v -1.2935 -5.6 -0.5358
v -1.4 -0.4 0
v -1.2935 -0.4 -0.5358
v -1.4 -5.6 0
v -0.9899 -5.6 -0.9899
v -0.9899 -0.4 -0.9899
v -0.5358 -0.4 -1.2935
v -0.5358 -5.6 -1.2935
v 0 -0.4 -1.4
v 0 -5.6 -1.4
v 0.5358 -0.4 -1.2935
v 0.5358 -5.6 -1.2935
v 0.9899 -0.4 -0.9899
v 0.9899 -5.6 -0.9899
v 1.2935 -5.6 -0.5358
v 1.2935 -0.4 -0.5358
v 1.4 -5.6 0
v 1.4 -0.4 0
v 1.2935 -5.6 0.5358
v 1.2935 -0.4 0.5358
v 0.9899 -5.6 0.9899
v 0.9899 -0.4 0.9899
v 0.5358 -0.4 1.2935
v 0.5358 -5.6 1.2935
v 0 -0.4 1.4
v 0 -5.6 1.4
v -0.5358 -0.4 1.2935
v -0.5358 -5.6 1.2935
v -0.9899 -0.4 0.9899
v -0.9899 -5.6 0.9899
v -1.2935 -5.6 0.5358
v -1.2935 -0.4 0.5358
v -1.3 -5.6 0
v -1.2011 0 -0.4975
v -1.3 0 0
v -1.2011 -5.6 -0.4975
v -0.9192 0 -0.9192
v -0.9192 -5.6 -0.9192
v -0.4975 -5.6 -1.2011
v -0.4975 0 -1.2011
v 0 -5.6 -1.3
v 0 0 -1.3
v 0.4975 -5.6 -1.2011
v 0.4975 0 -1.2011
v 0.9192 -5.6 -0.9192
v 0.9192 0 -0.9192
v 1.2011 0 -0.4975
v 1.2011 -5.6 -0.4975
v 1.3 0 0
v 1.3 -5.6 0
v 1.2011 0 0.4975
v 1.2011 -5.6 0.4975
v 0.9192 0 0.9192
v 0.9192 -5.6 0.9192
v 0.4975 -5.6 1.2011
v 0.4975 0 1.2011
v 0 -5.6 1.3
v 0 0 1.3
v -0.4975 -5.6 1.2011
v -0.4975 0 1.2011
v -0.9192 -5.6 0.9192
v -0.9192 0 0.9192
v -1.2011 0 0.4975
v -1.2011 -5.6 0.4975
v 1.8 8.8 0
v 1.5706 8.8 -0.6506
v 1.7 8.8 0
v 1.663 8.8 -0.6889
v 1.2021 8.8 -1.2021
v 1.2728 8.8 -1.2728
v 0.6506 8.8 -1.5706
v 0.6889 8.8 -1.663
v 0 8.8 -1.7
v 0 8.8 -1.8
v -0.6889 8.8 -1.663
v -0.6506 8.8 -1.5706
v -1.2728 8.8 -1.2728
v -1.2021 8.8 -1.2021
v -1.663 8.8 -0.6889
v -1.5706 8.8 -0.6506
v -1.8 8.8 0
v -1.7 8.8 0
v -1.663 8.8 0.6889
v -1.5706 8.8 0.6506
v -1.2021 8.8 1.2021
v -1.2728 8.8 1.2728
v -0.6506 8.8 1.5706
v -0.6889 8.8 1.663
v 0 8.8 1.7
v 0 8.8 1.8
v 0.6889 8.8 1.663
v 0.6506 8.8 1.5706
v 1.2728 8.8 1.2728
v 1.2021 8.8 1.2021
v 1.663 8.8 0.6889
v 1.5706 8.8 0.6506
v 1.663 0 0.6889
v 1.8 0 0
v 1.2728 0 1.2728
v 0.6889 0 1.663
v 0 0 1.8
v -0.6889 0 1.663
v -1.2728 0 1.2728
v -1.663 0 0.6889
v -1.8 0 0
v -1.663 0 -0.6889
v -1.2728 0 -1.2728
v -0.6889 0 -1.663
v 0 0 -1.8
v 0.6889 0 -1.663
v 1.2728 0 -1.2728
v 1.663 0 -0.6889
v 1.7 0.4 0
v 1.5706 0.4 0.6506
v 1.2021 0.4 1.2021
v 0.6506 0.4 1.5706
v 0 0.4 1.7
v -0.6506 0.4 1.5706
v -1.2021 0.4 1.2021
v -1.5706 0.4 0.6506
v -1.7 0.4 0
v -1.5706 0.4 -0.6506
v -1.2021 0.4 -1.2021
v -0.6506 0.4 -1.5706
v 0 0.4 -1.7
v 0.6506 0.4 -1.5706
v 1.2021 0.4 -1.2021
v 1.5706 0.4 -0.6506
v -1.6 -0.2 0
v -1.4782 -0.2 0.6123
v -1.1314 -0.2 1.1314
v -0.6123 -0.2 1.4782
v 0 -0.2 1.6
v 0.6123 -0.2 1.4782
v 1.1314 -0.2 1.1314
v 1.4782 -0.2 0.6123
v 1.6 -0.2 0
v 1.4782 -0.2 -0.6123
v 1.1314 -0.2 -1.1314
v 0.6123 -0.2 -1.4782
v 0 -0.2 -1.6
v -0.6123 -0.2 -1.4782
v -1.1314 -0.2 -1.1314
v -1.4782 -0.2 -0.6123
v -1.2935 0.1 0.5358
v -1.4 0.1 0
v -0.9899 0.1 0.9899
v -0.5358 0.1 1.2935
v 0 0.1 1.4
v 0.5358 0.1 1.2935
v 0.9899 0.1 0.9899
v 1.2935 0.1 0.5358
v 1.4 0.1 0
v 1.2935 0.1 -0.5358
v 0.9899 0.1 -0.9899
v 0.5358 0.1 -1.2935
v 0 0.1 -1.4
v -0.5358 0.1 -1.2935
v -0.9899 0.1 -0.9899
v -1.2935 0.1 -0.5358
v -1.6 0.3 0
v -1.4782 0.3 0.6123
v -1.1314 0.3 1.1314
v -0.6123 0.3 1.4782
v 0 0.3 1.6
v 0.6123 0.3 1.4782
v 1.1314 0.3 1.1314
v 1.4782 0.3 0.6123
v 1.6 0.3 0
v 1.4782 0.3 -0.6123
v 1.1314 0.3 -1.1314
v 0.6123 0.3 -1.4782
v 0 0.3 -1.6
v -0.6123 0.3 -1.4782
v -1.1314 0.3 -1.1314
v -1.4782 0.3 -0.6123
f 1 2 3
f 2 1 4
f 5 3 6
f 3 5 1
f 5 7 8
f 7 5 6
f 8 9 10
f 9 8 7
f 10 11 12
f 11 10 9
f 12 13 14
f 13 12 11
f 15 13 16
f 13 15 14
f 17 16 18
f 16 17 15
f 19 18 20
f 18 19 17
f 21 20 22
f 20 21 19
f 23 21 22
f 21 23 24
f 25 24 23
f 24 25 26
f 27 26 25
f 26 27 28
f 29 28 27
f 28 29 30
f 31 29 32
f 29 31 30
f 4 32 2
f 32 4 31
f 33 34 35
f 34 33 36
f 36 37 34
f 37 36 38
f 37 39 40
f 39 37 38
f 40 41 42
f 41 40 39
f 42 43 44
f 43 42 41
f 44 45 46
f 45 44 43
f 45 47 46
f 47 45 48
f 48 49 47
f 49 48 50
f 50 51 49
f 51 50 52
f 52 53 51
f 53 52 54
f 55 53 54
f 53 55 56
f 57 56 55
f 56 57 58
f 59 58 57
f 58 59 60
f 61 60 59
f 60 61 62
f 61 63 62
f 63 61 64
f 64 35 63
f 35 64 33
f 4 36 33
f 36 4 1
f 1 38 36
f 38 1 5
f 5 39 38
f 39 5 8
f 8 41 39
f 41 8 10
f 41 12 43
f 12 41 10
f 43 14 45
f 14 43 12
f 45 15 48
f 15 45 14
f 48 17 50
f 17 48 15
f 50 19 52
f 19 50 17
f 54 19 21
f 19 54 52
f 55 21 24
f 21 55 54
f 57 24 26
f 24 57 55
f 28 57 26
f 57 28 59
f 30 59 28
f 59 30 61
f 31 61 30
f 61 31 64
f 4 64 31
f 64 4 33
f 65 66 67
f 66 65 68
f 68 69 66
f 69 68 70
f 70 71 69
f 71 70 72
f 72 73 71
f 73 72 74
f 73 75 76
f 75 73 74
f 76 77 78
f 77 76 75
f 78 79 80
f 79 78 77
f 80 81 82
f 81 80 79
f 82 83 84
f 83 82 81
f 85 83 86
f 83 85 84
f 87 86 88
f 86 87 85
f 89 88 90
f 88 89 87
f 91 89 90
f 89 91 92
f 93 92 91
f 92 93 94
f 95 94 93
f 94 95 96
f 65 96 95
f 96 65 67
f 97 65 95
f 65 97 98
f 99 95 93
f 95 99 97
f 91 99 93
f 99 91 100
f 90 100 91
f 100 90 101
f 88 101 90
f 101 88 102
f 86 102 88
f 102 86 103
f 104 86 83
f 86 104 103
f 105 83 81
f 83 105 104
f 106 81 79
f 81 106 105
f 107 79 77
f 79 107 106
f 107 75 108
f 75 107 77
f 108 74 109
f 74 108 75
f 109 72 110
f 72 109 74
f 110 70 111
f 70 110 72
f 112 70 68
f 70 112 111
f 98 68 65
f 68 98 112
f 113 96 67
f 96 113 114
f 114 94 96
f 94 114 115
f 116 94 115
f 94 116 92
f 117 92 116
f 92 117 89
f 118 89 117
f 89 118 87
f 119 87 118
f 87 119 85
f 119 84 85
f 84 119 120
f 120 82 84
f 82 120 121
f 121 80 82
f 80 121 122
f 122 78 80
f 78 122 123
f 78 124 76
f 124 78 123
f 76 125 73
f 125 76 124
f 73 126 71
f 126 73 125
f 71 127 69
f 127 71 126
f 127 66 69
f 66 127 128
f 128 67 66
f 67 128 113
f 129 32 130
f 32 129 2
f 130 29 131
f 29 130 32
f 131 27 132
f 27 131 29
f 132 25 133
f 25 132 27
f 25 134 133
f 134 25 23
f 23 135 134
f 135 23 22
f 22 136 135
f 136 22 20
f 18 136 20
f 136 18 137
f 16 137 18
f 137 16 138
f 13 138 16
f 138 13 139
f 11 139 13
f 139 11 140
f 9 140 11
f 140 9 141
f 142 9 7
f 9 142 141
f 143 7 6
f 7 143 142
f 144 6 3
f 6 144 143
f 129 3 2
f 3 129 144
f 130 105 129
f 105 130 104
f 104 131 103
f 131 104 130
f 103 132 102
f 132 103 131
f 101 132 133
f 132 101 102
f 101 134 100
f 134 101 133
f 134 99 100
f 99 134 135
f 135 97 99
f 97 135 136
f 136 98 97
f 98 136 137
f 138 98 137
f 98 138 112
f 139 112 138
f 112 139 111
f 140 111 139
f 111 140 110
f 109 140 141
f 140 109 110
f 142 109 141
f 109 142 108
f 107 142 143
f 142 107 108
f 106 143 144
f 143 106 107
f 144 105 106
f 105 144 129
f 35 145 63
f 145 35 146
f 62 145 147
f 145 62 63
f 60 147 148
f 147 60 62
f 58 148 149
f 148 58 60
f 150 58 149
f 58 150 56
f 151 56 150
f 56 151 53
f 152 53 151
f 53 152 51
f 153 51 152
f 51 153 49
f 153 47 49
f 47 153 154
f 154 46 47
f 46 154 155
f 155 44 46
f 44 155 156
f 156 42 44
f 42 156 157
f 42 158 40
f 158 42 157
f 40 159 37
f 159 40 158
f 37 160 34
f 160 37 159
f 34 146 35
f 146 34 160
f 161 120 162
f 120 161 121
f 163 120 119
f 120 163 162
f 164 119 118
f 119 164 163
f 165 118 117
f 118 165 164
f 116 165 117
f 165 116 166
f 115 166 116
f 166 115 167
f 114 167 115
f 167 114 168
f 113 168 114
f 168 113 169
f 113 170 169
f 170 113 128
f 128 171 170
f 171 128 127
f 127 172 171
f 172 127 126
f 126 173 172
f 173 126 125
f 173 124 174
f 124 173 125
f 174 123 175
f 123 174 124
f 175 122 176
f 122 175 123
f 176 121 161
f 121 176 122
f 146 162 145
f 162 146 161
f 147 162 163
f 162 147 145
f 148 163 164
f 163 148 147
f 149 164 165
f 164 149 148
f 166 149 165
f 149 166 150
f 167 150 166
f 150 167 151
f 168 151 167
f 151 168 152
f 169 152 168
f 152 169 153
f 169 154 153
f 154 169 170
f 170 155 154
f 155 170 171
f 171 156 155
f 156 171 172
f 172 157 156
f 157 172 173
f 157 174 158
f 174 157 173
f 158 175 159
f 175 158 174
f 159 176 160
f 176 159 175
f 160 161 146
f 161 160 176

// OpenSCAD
// file: ../p/4-4rin17.scad
use <../lib.scad>
function ldraw_lib__4_4rin17() = [
// 0 Ring 17 x 1.0
// 0 Name: 4-4rin17.dat
// 0 Author: Miklos Hosszu [hmick]
// 0 !LDRAW_ORG Primitive UPDATE 2012-01
// 0 !LICENSE Licensed under CC BY 2.0 and CC BY 4.0 : see CAreadme.txt
// 
// 0 BFC CERTIFY CCW
  [0,"BFC","CERTIFY"],
  [0,"BFC","CCW"],
// 
// 0 !HISTORY 2004-11-06 [PTadmin] Official Update 2004-04
// 0 !HISTORY 2007-06-24 [PTadmin] Header formatted for Contributor Agreement
// 0 !HISTORY 2008-07-01 [PTadmin] Official Update 2008-01
// 0 !HISTORY 2012-02-16 [Philo] Changed to CCW
// 0 !HISTORY 2012-03-30 [PTadmin] Official Update 2012-01
// 
// 
// 4 16 18 0 0 16.6302 0 6.8886 15.7063 0 6.5059 17 0 0
  [4,16,18,0,0,16.6302,0,6.8886,15.7063,0,6.5059,17,0,0],
// 4 16 16.6302 0 6.8886 12.7278 0 12.7278 12.0207 0 12.0207 15.7063 0 6.5059
  [4,16,16.6302,0,6.8886,12.7278,0,12.7278,12.0207,0,12.0207,15.7063,0,6.5059],
// 4 16 12.7278 0 12.7278 6.8886 0 16.6302 6.5059 0 15.7063 12.0207 0 12.0207
  [4,16,12.7278,0,12.7278,6.8886,0,16.6302,6.5059,0,15.7063,12.0207,0,12.0207],
// 4 16 6.8886 0 16.6302 0 0 18 0 0 17 6.5059 0 15.7063
  [4,16,6.8886,0,16.6302,0,0,18,0,0,17,6.5059,0,15.7063],
// 4 16 0 0 18 -6.8886 0 16.6302 -6.5059 0 15.7063 0 0 17
  [4,16,0,0,18,-6.8886,0,16.6302,-6.5059,0,15.7063,0,0,17],
// 4 16 -6.8886 0 16.6302 -12.7278 0 12.7278 -12.0207 0 12.0207 -6.5059 0 15.7063
  [4,16,-6.8886,0,16.6302,-12.7278,0,12.7278,-12.0207,0,12.0207,-6.5059,0,15.7063],
// 4 16 -12.7278 0 12.7278 -16.6302 0 6.8886 -15.7063 0 6.5059 -12.0207 0 12.0207
  [4,16,-12.7278,0,12.7278,-16.6302,0,6.8886,-15.7063,0,6.5059,-12.0207,0,12.0207],
// 4 16 -16.6302 0 6.8886 -18 0 0 -17 0 0 -15.7063 0 6.5059
  [4,16,-16.6302,0,6.8886,-18,0,0,-17,0,0,-15.7063,0,6.5059],
// 4 16 -18 0 0 -16.6302 0 -6.8886 -15.7063 0 -6.5059 -17 0 0
  [4,16,-18,0,0,-16.6302,0,-6.8886,-15.7063,0,-6.5059,-17,0,0],
// 4 16 -16.6302 0 -6.8886 -12.7278 0 -12.7278 -12.0207 0 -12.0207 -15.7063 0 -6.5059
  [4,16,-16.6302,0,-6.8886,-12.7278,0,-12.7278,-12.0207,0,-12.0207,-15.7063,0,-6.5059],
// 4 16 -12.7278 0 -12.7278 -6.8886 0 -16.6302 -6.5059 0 -15.7063 -12.0207 0 -12.0207
  [4,16,-12.7278,0,-12.7278,-6.8886,0,-16.6302,-6.5059,0,-15.7063,-12.0207,0,-12.0207],
// 4 16 -6.8886 0 -16.6302 0 0 -18 0 0 -17 -6.5059 0 -15.7063
  [4,16,-6.8886,0,-16.6302,0,0,-18,0,0,-17,-6.5059,0,-15.7063],
// 4 16 0 0 -18 6.8886 0 -16.6302 6.5059 0 -15.7063 0 0 -17
  [4,16,0,0,-18,6.8886,0,-16.6302,6.5059,0,-15.7063,0,0,-17],
// 4 16 6.8886 0 -16.6302 12.7278 0 -12.7278 12.0207 0 -12.0207 6.5059 0 -15.7063
  [4,16,6.8886,0,-16.6302,12.7278,0,-12.7278,12.0207,0,-12.0207,6.5059,0,-15.7063],
// 4 16 12.7278 0 -12.7278 16.6302 0 -6.8886 15.7063 0 -6.5059 12.0207 0 -12.0207
  [4,16,12.7278,0,-12.7278,16.6302,0,-6.8886,15.7063,0,-6.5059,12.0207,0,-12.0207],
// 4 16 16.6302 0 -6.8886 18 0 0 17 0 0 15.7063 0 -6.5059
  [4,16,16.6302,0,-6.8886,18,0,0,17,0,0,15.7063,0,-6.5059],
];
makepoly(ldraw_lib__4_4rin17(), line=0.2);
// file: ../p/4-4rin13.scad
use <../lib.scad>
function ldraw_lib__4_4rin13() = [
// 0 Ring 13 x 1.0
// 0 Name: 4-4rin13.dat
// 0 Author: John Riley [jriley]
// 0 !LDRAW_ORG Primitive UPDATE 2003-03
// 0 !LICENSE Licensed under CC BY 2.0 and CC BY 4.0 : see CAreadme.txt
// 
// 0 BFC CERTIFY CCW
  [0,"BFC","CERTIFY"],
  [0,"BFC","CCW"],
// 
// 0 !HISTORY 2003-12-19 [PTadmin] Official Update 2003-03
// 0 !HISTORY 2007-06-24 [PTadmin] Header formatted for Contributor Agreement
// 0 !HISTORY 2008-07-01 [PTadmin] Official Update 2008-01
// 
// 
// 4 16 13 0 0 14 0 0 12.9346 0 5.3578 12.0107 0 4.9751
  [4,16,13,0,0,14,0,0,12.9346,0,5.3578,12.0107,0,4.9751],
// 4 16 12.0107 0 4.9751 12.9346 0 5.3578 9.8994 0 9.8994 9.1923 0 9.1923
  [4,16,12.0107,0,4.9751,12.9346,0,5.3578,9.8994,0,9.8994,9.1923,0,9.1923],
// 4 16 9.1923 0 9.1923 9.8994 0 9.8994 5.3578 0 12.9346 4.9751 0 12.0107
  [4,16,9.1923,0,9.1923,9.8994,0,9.8994,5.3578,0,12.9346,4.9751,0,12.0107],
// 4 16 4.9751 0 12.0107 5.3578 0 12.9346 0 0 14 0 0 13
  [4,16,4.9751,0,12.0107,5.3578,0,12.9346,0,0,14,0,0,13],
// 4 16 0 0 13 0 0 14 -5.3578 0 12.9346 -4.9751 0 12.0107
  [4,16,0,0,13,0,0,14,-5.3578,0,12.9346,-4.9751,0,12.0107],
// 4 16 -4.9751 0 12.0107 -5.3578 0 12.9346 -9.8994 0 9.8994 -9.1923 0 9.1923
  [4,16,-4.9751,0,12.0107,-5.3578,0,12.9346,-9.8994,0,9.8994,-9.1923,0,9.1923],
// 4 16 -9.1923 0 9.1923 -9.8994 0 9.8994 -12.9346 0 5.3578 -12.0107 0 4.9751
  [4,16,-9.1923,0,9.1923,-9.8994,0,9.8994,-12.9346,0,5.3578,-12.0107,0,4.9751],
// 4 16 -12.0107 0 4.9751 -12.9346 0 5.3578 -14 0 0 -13 0 0
  [4,16,-12.0107,0,4.9751,-12.9346,0,5.3578,-14,0,0,-13,0,0],
// 4 16 -13 0 0 -14 0 0 -12.9346 0 -5.3578 -12.0107 0 -4.9751
  [4,16,-13,0,0,-14,0,0,-12.9346,0,-5.3578,-12.0107,0,-4.9751],
// 4 16 -12.0107 0 -4.9751 -12.9346 0 -5.3578 -9.8994 0 -9.8994 -9.1923 0 -9.1923
  [4,16,-12.0107,0,-4.9751,-12.9346,0,-5.3578,-9.8994,0,-9.8994,-9.1923,0,-9.1923],
// 4 16 -9.1923 0 -9.1923 -9.8994 0 -9.8994 -5.3578 0 -12.9346 -4.9751 0 -12.0107
  [4,16,-9.1923,0,-9.1923,-9.8994,0,-9.8994,-5.3578,0,-12.9346,-4.9751,0,-12.0107],
// 4 16 -4.9751 0 -12.0107 -5.3578 0 -12.9346 0 0 -14 0 0 -13
  [4,16,-4.9751,0,-12.0107,-5.3578,0,-12.9346,0,0,-14,0,0,-13],
// 4 16 0 0 -13 0 0 -14 5.3578 0 -12.9346 4.9751 0 -12.0107
  [4,16,0,0,-13,0,0,-14,5.3578,0,-12.9346,4.9751,0,-12.0107],
// 4 16 4.9751 0 -12.0107 5.3578 0 -12.9346 9.8994 0 -9.8994 9.1923 0 -9.1923
  [4,16,4.9751,0,-12.0107,5.3578,0,-12.9346,9.8994,0,-9.8994,9.1923,0,-9.1923],
// 4 16 9.1923 0 -9.1923 9.8994 0 -9.8994 12.9346 0 -5.3578 12.0107 0 -4.9751
  [4,16,9.1923,0,-9.1923,9.8994,0,-9.8994,12.9346,0,-5.3578,12.0107,0,-4.9751],
// 4 16 12.0107 0 -4.9751 12.9346 0 -5.3578 14 0 0 13 0 0
  [4,16,12.0107,0,-4.9751,12.9346,0,-5.3578,14,0,0,13,0,0],
// 0
// 
];
makepoly(ldraw_lib__4_4rin13(), line=0.2);
// file: ../p/4-4edge.scad
use <../lib.scad>
function ldraw_lib__4_4edge() = [
// 0 Circle 1.0
// 0 Name: 4-4edge.dat
// 0 Author: James Jessiman
// 0 !LDRAW_ORG Primitive UPDATE 2017-01
// 0 !LICENSE Licensed under CC BY 2.0 and CC BY 4.0 : see CAreadme.txt
// 
// 0 BFC CERTIFY CCW
  [0,"BFC","CERTIFY"],
  [0,"BFC","CCW"],
// 
// 0 !HISTORY 1998-12-15 [PTadmin] Official Update 1998-10
// 0 !HISTORY 2005-12-28 [PTadmin] Official Update 2005-01
// 0 !HISTORY 2007-06-24 [PTadmin] Header formatted for Contributor Agreement
// 0 !HISTORY 2008-07-01 [PTadmin] Official Update 2008-01
// 0 !HISTORY 2017-01-15 [Steffen] BFCed
// 0 !HISTORY 2017-12-30 [PTadmin] Official Update 2017-01
// 
// 
// 2 24 1 0 0 0.9239 0 0.3827
  [2,24,1,0,0,0.9239,0,0.3827],
// 2 24 0.9239 0 0.3827 0.7071 0 0.7071
  [2,24,0.9239,0,0.3827,0.7071,0,0.7071],
// 2 24 0.7071 0 0.7071 0.3827 0 0.9239
  [2,24,0.7071,0,0.7071,0.3827,0,0.9239],
// 2 24 0.3827 0 0.9239 0 0 1
  [2,24,0.3827,0,0.9239,0,0,1],
// 2 24 0 0 1 -0.3827 0 0.9239
  [2,24,0,0,1,-0.3827,0,0.9239],
// 2 24 -0.3827 0 0.9239 -0.7071 0 0.7071
  [2,24,-0.3827,0,0.9239,-0.7071,0,0.7071],
// 2 24 -0.7071 0 0.7071 -0.9239 0 0.3827
  [2,24,-0.7071,0,0.7071,-0.9239,0,0.3827],
// 2 24 -0.9239 0 0.3827 -1 0 -0
  [2,24,-0.9239,0,0.3827,-1,0,-0],
// 2 24 -1 0 -0 -0.9239 0 -0.3827
  [2,24,-1,0,-0,-0.9239,0,-0.3827],
// 2 24 -0.9239 0 -0.3827 -0.7071 0 -0.7071
  [2,24,-0.9239,0,-0.3827,-0.7071,0,-0.7071],
// 2 24 -0.7071 0 -0.7071 -0.3827 0 -0.9239
  [2,24,-0.7071,0,-0.7071,-0.3827,0,-0.9239],
// 2 24 -0.3827 0 -0.9239 0 0 -1
  [2,24,-0.3827,0,-0.9239,0,0,-1],
// 2 24 0 0 -1 0.3827 0 -0.9239
  [2,24,0,0,-1,0.3827,0,-0.9239],
// 2 24 0.3827 0 -0.9239 0.7071 0 -0.7071
  [2,24,0.3827,0,-0.9239,0.7071,0,-0.7071],
// 2 24 0.7071 0 -0.7071 0.9239 0 -0.3827
  [2,24,0.7071,0,-0.7071,0.9239,0,-0.3827],
// 2 24 0.9239 0 -0.3827 1 0 0
  [2,24,0.9239,0,-0.3827,1,0,0],
];
makepoly(ldraw_lib__4_4edge(), line=0.2);
// file: ../p/4-4cyli.scad
use <../lib.scad>
function ldraw_lib__4_4cyli() = [
// 0 Cylinder 1.0
// 0 Name: 4-4cyli.dat
// 0 Author: James Jessiman
// 0 !LDRAW_ORG Primitive UPDATE 2005-01
// 0 !LICENSE Licensed under CC BY 2.0 and CC BY 4.0 : see CAreadme.txt
// 
// 0 BFC CERTIFY CCW
  [0,"BFC","CERTIFY"],
  [0,"BFC","CCW"],
// 
// 0 !HISTORY 1998-12-15 [PTadmin] Official Update 1998-10
// 0 !HISTORY 2002-03-23 [sbliss] Added BFC statement; merged headers from files in distributions LDraw 0.27 and Complete.
// 0 !HISTORY 2002-04-25 [PTadmin] Official Update 2002-02
// 0 !HISTORY 2004-12-14 [guyvivan] BFC CCW
// 0 !HISTORY 2005-12-28 [PTadmin] Official Update 2005-01
// 0 !HISTORY 2007-06-24 [PTadmin] Header formatted for Contributor Agreement
// 0 !HISTORY 2008-07-01 [PTadmin] Official Update 2008-01
// 
// 
// 4 16 1 1 0 0.9239 1 0.3827 0.9239 0 0.3827 1 0 0
  [4,16,1,1,0,0.9239,1,0.3827,0.9239,0,0.3827,1,0,0],
// 5 24 1 0 0 1 1 0 0.9239 0 0.3827 0.9239 0 -0.3827
  [5,24,1,0,0,1,1,0,0.9239,0,0.3827,0.9239,0,-0.3827],
// 4 16 0.9239 1 0.3827 0.7071 1 0.7071 0.7071 0 0.7071 0.9239 0 0.3827
  [4,16,0.9239,1,0.3827,0.7071,1,0.7071,0.7071,0,0.7071,0.9239,0,0.3827],
// 5 24 0.9239 0 0.3827 0.9239 1 0.3827 0.7071 0 0.7071 1 0 0
  [5,24,0.9239,0,0.3827,0.9239,1,0.3827,0.7071,0,0.7071,1,0,0],
// 4 16 0.7071 1 0.7071 0.3827 1 0.9239 0.3827 0 0.9239 0.7071 0 0.7071
  [4,16,0.7071,1,0.7071,0.3827,1,0.9239,0.3827,0,0.9239,0.7071,0,0.7071],
// 5 24 0.7071 0 0.7071 0.7071 1 0.7071 0.3827 0 0.9239 0.9239 0 0.3827
  [5,24,0.7071,0,0.7071,0.7071,1,0.7071,0.3827,0,0.9239,0.9239,0,0.3827],
// 4 16 0.3827 1 0.9239 0 1 1 0 0 1 0.3827 0 0.9239
  [4,16,0.3827,1,0.9239,0,1,1,0,0,1,0.3827,0,0.9239],
// 5 24 0.3827 0 0.9239 0.3827 1 0.9239 0 0 1 0.7071 0 0.7071
  [5,24,0.3827,0,0.9239,0.3827,1,0.9239,0,0,1,0.7071,0,0.7071],
// 4 16 0 1 1 -0.3827 1 0.9239 -0.3827 0 0.9239 0 0 1
  [4,16,0,1,1,-0.3827,1,0.9239,-0.3827,0,0.9239,0,0,1],
// 5 24 0 0 1 0 1 1 -0.3827 0 0.9239 0.3827 0 0.9239
  [5,24,0,0,1,0,1,1,-0.3827,0,0.9239,0.3827,0,0.9239],
// 4 16 -0.3827 1 0.9239 -0.7071 1 0.7071 -0.7071 0 0.7071 -0.3827 0 0.9239
  [4,16,-0.3827,1,0.9239,-0.7071,1,0.7071,-0.7071,0,0.7071,-0.3827,0,0.9239],
// 5 24 -0.3827 0 0.9239 -0.3827 1 0.9239 -0.7071 0 0.7071 0 0 1
  [5,24,-0.3827,0,0.9239,-0.3827,1,0.9239,-0.7071,0,0.7071,0,0,1],
// 4 16 -0.7071 1 0.7071 -0.9239 1 0.3827 -0.9239 0 0.3827 -0.7071 0 0.7071
  [4,16,-0.7071,1,0.7071,-0.9239,1,0.3827,-0.9239,0,0.3827,-0.7071,0,0.7071],
// 5 24 -0.7071 0 0.7071 -0.7071 1 0.7071 -0.9239 0 0.3827 -0.3827 0 0.9239
  [5,24,-0.7071,0,0.7071,-0.7071,1,0.7071,-0.9239,0,0.3827,-0.3827,0,0.9239],
// 4 16 -0.9239 1 0.3827 -1 1 0 -1 0 0 -0.9239 0 0.3827
  [4,16,-0.9239,1,0.3827,-1,1,0,-1,0,0,-0.9239,0,0.3827],
// 5 24 -0.9239 0 0.3827 -0.9239 1 0.3827 -1 0 0 -0.7071 0 0.7071
  [5,24,-0.9239,0,0.3827,-0.9239,1,0.3827,-1,0,0,-0.7071,0,0.7071],
// 4 16 -1 1 0 -0.9239 1 -0.3827 -0.9239 0 -0.3827 -1 0 0
  [4,16,-1,1,0,-0.9239,1,-0.3827,-0.9239,0,-0.3827,-1,0,0],
// 5 24 -1 0 0 -1 1 0 -0.9239 0 -0.3827 -0.9239 0 0.3827
  [5,24,-1,0,0,-1,1,0,-0.9239,0,-0.3827,-0.9239,0,0.3827],
// 4 16 -0.9239 1 -0.3827 -0.7071 1 -0.7071 -0.7071 0 -0.7071 -0.9239 0 -0.3827
  [4,16,-0.9239,1,-0.3827,-0.7071,1,-0.7071,-0.7071,0,-0.7071,-0.9239,0,-0.3827],
// 5 24 -0.9239 0 -0.3827 -0.9239 1 -0.3827 -0.7071 0 -0.7071 -1 0 0
  [5,24,-0.9239,0,-0.3827,-0.9239,1,-0.3827,-0.7071,0,-0.7071,-1,0,0],
// 4 16 -0.7071 1 -0.7071 -0.3827 1 -0.9239 -0.3827 0 -0.9239 -0.7071 0 -0.7071
  [4,16,-0.7071,1,-0.7071,-0.3827,1,-0.9239,-0.3827,0,-0.9239,-0.7071,0,-0.7071],
// 5 24 -0.7071 0 -0.7071 -0.7071 1 -0.7071 -0.3827 0 -0.9239 -0.9239 0 -0.3827
  [5,24,-0.7071,0,-0.7071,-0.7071,1,-0.7071,-0.3827,0,-0.9239,-0.9239,0,-0.3827],
// 4 16 -0.3827 1 -0.9239 0 1 -1 0 0 -1 -0.3827 0 -0.9239
  [4,16,-0.3827,1,-0.9239,0,1,-1,0,0,-1,-0.3827,0,-0.9239],
// 5 24 -0.3827 0 -0.9239 -0.3827 1 -0.9239 0 0 -1 -0.7071 0 -0.7071
  [5,24,-0.3827,0,-0.9239,-0.3827,1,-0.9239,0,0,-1,-0.7071,0,-0.7071],
// 4 16 0 1 -1 0.3827 1 -0.9239 0.3827 0 -0.9239 0 0 -1
  [4,16,0,1,-1,0.3827,1,-0.9239,0.3827,0,-0.9239,0,0,-1],
// 5 24 0 0 -1 0 1 -1 0.3827 0 -0.9239 -0.3827 0 -0.9239
  [5,24,0,0,-1,0,1,-1,0.3827,0,-0.9239,-0.3827,0,-0.9239],
// 4 16 0.3827 1 -0.9239 0.7071 1 -0.7071 0.7071 0 -0.7071 0.3827 0 -0.9239
  [4,16,0.3827,1,-0.9239,0.7071,1,-0.7071,0.7071,0,-0.7071,0.3827,0,-0.9239],
// 5 24 0.3827 0 -0.9239 0.3827 1 -0.9239 0.7071 0 -0.7071 0 0 -1
  [5,24,0.3827,0,-0.9239,0.3827,1,-0.9239,0.7071,0,-0.7071,0,0,-1],
// 4 16 0.7071 1 -0.7071 0.9239 1 -0.3827 0.9239 0 -0.3827 0.7071 0 -0.7071
  [4,16,0.7071,1,-0.7071,0.9239,1,-0.3827,0.9239,0,-0.3827,0.7071,0,-0.7071],
// 5 24 0.7071 0 -0.7071 0.7071 1 -0.7071 0.9239 0 -0.3827 0.3827 0 -0.9239
  [5,24,0.7071,0,-0.7071,0.7071,1,-0.7071,0.9239,0,-0.3827,0.3827,0,-0.9239],
// 4 16 0.9239 1 -0.3827 1 1 0 1 0 0 0.9239 0 -0.3827
  [4,16,0.9239,1,-0.3827,1,1,0,1,0,0,0.9239,0,-0.3827],
// 5 24 0.9239 0 -0.3827 0.9239 1 -0.3827 1 0 0 0.7071 0 -0.7071
  [5,24,0.9239,0,-0.3827,0.9239,1,-0.3827,1,0,0,0.7071,0,-0.7071],
// 0
];
makepoly(ldraw_lib__4_4cyli(), line=0.2);
// file: ../p/4-4con8.scad
use <../lib.scad>
function ldraw_lib__4_4con8() = [
// 0 Cone  8 x 1.0
// 0 Name: 4-4con8.dat
// 0 Author: Steve Bliss [sbliss]
// 0 !LDRAW_ORG Primitive UPDATE 2012-01
// 0 !LICENSE Licensed under CC BY 2.0 and CC BY 4.0 : see CAreadme.txt
// 
// 0 BFC CERTIFY CCW
  [0,"BFC","CERTIFY"],
  [0,"BFC","CCW"],
// 
// 0 !HISTORY 2000-09-30 [PTadmin] Official Update 2000-02
// 0 !HISTORY 2002-12-11 [cwdee] Standardised title
// 0 !HISTORY 2003-03-12 [PTadmin] Official Update 2003-01
// 0 !HISTORY 2007-06-24 [PTadmin] Header formatted for Contributor Agreement
// 0 !HISTORY 2008-07-01 [PTadmin] Official Update 2008-01
// 0 !HISTORY 2012-02-16 [Philo] Changed to CCW
// 0 !HISTORY 2012-03-30 [PTadmin] Official Update 2012-01
// 
// 
// 5 24 8 1 0 9 0 0 7.3912 1 -3.0616 7.3912 1 3.0616
  [5,24,8,1,0,9,0,0,7.3912,1,-3.0616,7.3912,1,3.0616],
// 5 24 7.3912 1 3.0616 8.3151 0 3.4443 8 1 0 5.6568 1 5.6568
  [5,24,7.3912,1,3.0616,8.3151,0,3.4443,8,1,0,5.6568,1,5.6568],
// 5 24 5.6568 1 5.6568 6.3639 0 6.3639 7.3912 1 3.0616 3.0616 1 7.3912
  [5,24,5.6568,1,5.6568,6.3639,0,6.3639,7.3912,1,3.0616,3.0616,1,7.3912],
// 5 24 3.0616 1 7.3912 3.4443 0 8.3151 5.6568 1 5.6568 0 1 8
  [5,24,3.0616,1,7.3912,3.4443,0,8.3151,5.6568,1,5.6568,0,1,8],
// 5 24 0 1 8 0 0 9 3.0616 1 7.3912 -3.0616 1 7.3912
  [5,24,0,1,8,0,0,9,3.0616,1,7.3912,-3.0616,1,7.3912],
// 5 24 -3.0616 1 7.3912 -3.4443 0 8.3151 0 1 8 -5.6568 1 5.6568
  [5,24,-3.0616,1,7.3912,-3.4443,0,8.3151,0,1,8,-5.6568,1,5.6568],
// 5 24 -5.6568 1 5.6568 -6.3639 0 6.3639 -3.0616 1 7.3912 -7.3912 1 3.0616
  [5,24,-5.6568,1,5.6568,-6.3639,0,6.3639,-3.0616,1,7.3912,-7.3912,1,3.0616],
// 5 24 -7.3912 1 3.0616 -8.3151 0 3.4443 -5.6568 1 5.6568 -8 1 0
  [5,24,-7.3912,1,3.0616,-8.3151,0,3.4443,-5.6568,1,5.6568,-8,1,0],
// 5 24 -8 1 0 -9 0 0 -7.3912 1 3.0616 -7.3912 1 -3.0616
  [5,24,-8,1,0,-9,0,0,-7.3912,1,3.0616,-7.3912,1,-3.0616],
// 5 24 -7.3912 1 -3.0616 -8.3151 0 -3.4443 -8 1 0 -5.6568 1 -5.6568
  [5,24,-7.3912,1,-3.0616,-8.3151,0,-3.4443,-8,1,0,-5.6568,1,-5.6568],
// 5 24 -5.6568 1 -5.6568 -6.3639 0 -6.3639 -7.3912 1 -3.0616 -3.0616 1 -7.3912
  [5,24,-5.6568,1,-5.6568,-6.3639,0,-6.3639,-7.3912,1,-3.0616,-3.0616,1,-7.3912],
// 5 24 -3.0616 1 -7.3912 -3.4443 0 -8.3151 -5.6568 1 -5.6568 0 1 -8
  [5,24,-3.0616,1,-7.3912,-3.4443,0,-8.3151,-5.6568,1,-5.6568,0,1,-8],
// 5 24 0 1 -8 0 0 -9 -3.0616 1 -7.3912 3.0616 1 -7.3912
  [5,24,0,1,-8,0,0,-9,-3.0616,1,-7.3912,3.0616,1,-7.3912],
// 5 24 3.0616 1 -7.3912 3.4443 0 -8.3151 0 1 -8 5.6568 1 -5.6568
  [5,24,3.0616,1,-7.3912,3.4443,0,-8.3151,0,1,-8,5.6568,1,-5.6568],
// 5 24 5.6568 1 -5.6568 6.3639 0 -6.3639 3.0616 1 -7.3912 7.3912 1 -3.0616
  [5,24,5.6568,1,-5.6568,6.3639,0,-6.3639,3.0616,1,-7.3912,7.3912,1,-3.0616],
// 5 24 7.3912 1 -3.0616 8.3151 0 -3.4443 5.6568 1 -5.6568 8 1 0
  [5,24,7.3912,1,-3.0616,8.3151,0,-3.4443,5.6568,1,-5.6568,8,1,0],
// 
// 4 16 7.3912 1 3.0616 8.3151 0 3.4443 9 0 0 8 1 0
  [4,16,7.3912,1,3.0616,8.3151,0,3.4443,9,0,0,8,1,0],
// 4 16 5.6568 1 5.6568 6.3639 0 6.3639 8.3151 0 3.4443 7.3912 1 3.0616
  [4,16,5.6568,1,5.6568,6.3639,0,6.3639,8.3151,0,3.4443,7.3912,1,3.0616],
// 4 16 3.0616 1 7.3912 3.4443 0 8.3151 6.3639 0 6.3639 5.6568 1 5.6568
  [4,16,3.0616,1,7.3912,3.4443,0,8.3151,6.3639,0,6.3639,5.6568,1,5.6568],
// 4 16 0 1 8 0 0 9 3.4443 0 8.3151 3.0616 1 7.3912
  [4,16,0,1,8,0,0,9,3.4443,0,8.3151,3.0616,1,7.3912],
// 4 16 -3.0616 1 7.3912 -3.4443 0 8.3151 0 0 9 0 1 8
  [4,16,-3.0616,1,7.3912,-3.4443,0,8.3151,0,0,9,0,1,8],
// 4 16 -5.6568 1 5.6568 -6.3639 0 6.3639 -3.4443 0 8.3151 -3.0616 1 7.3912
  [4,16,-5.6568,1,5.6568,-6.3639,0,6.3639,-3.4443,0,8.3151,-3.0616,1,7.3912],
// 4 16 -7.3912 1 3.0616 -8.3151 0 3.4443 -6.3639 0 6.3639 -5.6568 1 5.6568
  [4,16,-7.3912,1,3.0616,-8.3151,0,3.4443,-6.3639,0,6.3639,-5.6568,1,5.6568],
// 4 16 -8 1 0 -9 0 0 -8.3151 0 3.4443 -7.3912 1 3.0616
  [4,16,-8,1,0,-9,0,0,-8.3151,0,3.4443,-7.3912,1,3.0616],
// 4 16 -7.3912 1 -3.0616 -8.3151 0 -3.4443 -9 0 0 -8 1 0
  [4,16,-7.3912,1,-3.0616,-8.3151,0,-3.4443,-9,0,0,-8,1,0],
// 4 16 -5.6568 1 -5.6568 -6.3639 0 -6.3639 -8.3151 0 -3.4443 -7.3912 1 -3.0616
  [4,16,-5.6568,1,-5.6568,-6.3639,0,-6.3639,-8.3151,0,-3.4443,-7.3912,1,-3.0616],
// 4 16 -3.0616 1 -7.3912 -3.4443 0 -8.3151 -6.3639 0 -6.3639 -5.6568 1 -5.6568
  [4,16,-3.0616,1,-7.3912,-3.4443,0,-8.3151,-6.3639,0,-6.3639,-5.6568,1,-5.6568],
// 4 16 0 1 -8 0 0 -9 -3.4443 0 -8.3151 -3.0616 1 -7.3912
  [4,16,0,1,-8,0,0,-9,-3.4443,0,-8.3151,-3.0616,1,-7.3912],
// 4 16 3.0616 1 -7.3912 3.4443 0 -8.3151 0 0 -9 0 1 -8
  [4,16,3.0616,1,-7.3912,3.4443,0,-8.3151,0,0,-9,0,1,-8],
// 4 16 5.6568 1 -5.6568 6.3639 0 -6.3639 3.4443 0 -8.3151 3.0616 1 -7.3912
  [4,16,5.6568,1,-5.6568,6.3639,0,-6.3639,3.4443,0,-8.3151,3.0616,1,-7.3912],
// 4 16 7.3912 1 -3.0616 8.3151 0 -3.4443 6.3639 0 -6.3639 5.6568 1 -5.6568
  [4,16,7.3912,1,-3.0616,8.3151,0,-3.4443,6.3639,0,-6.3639,5.6568,1,-5.6568],
// 4 16 8 1 0 9 0 0 8.3151 0 -3.4443 7.3912 1 -3.0616
  [4,16,8,1,0,9,0,0,8.3151,0,-3.4443,7.3912,1,-3.0616],
];
makepoly(ldraw_lib__4_4con8(), line=0.2);
// file: ../p/4-4con7.scad
use <../lib.scad>
function ldraw_lib__4_4con7() = [
// 0 Cone  7 x 1.0
// 0 Name: 4-4con7.dat
// 0 Author: Niels Karsdorp [nielsk]
// 0 !LDRAW_ORG Primitive UPDATE 2004-04
// 0 !LICENSE Licensed under CC BY 2.0 and CC BY 4.0 : see CAreadme.txt
// 
// 0 BFC CERTIFY CCW
  [0,"BFC","CERTIFY"],
  [0,"BFC","CCW"],
// 
// 0 !HISTORY 2004-11-06 [PTadmin] Official Update 2004-04
// 0 !HISTORY 2007-06-24 [PTadmin] Header formatted for Contributor Agreement
// 0 !HISTORY 2008-07-01 [PTadmin] Official Update 2008-01
// 
// 
// 5 24 7 1 0 8 0 0 6.4673 1 2.6789 6.4673 1 -2.6789
  [5,24,7,1,0,8,0,0,6.4673,1,2.6789,6.4673,1,-2.6789],
// 5 24 6.4673 1 2.6789 7.3912 0 3.0616 4.9497 1 4.9497 7 1 0
  [5,24,6.4673,1,2.6789,7.3912,0,3.0616,4.9497,1,4.9497,7,1,0],
// 5 24 4.9497 1 4.9497 5.6568 0 5.6568 2.6789 1 6.4673 6.4673 1 2.6789
  [5,24,4.9497,1,4.9497,5.6568,0,5.6568,2.6789,1,6.4673,6.4673,1,2.6789],
// 5 24 2.6789 1 6.4673 3.0616 0 7.3912 0 1 7 4.9497 1 4.9497
  [5,24,2.6789,1,6.4673,3.0616,0,7.3912,0,1,7,4.9497,1,4.9497],
// 5 24 0 1 7 0 0 8 -2.6789 1 6.4673 2.6789 1 6.4673
  [5,24,0,1,7,0,0,8,-2.6789,1,6.4673,2.6789,1,6.4673],
// 5 24 -2.6789 1 6.4673 -3.0616 0 7.3912 -4.9497 1 4.9497 0 1 7
  [5,24,-2.6789,1,6.4673,-3.0616,0,7.3912,-4.9497,1,4.9497,0,1,7],
// 5 24 -4.9497 1 4.9497 -5.6568 0 5.6568 -6.4673 1 2.6789 -2.6789 1 6.4673
  [5,24,-4.9497,1,4.9497,-5.6568,0,5.6568,-6.4673,1,2.6789,-2.6789,1,6.4673],
// 5 24 -6.4673 1 2.6789 -7.3912 0 3.0616 -7 1 0 -4.9497 1 4.9497
  [5,24,-6.4673,1,2.6789,-7.3912,0,3.0616,-7,1,0,-4.9497,1,4.9497],
// 5 24 -7 1 0 -8 0 0 -6.4673 1 -2.6789 -6.4673 1 2.6789
  [5,24,-7,1,0,-8,0,0,-6.4673,1,-2.6789,-6.4673,1,2.6789],
// 5 24 -6.4673 1 -2.6789 -7.3912 0 -3.0616 -4.9497 1 -4.9497 -7 1 0
  [5,24,-6.4673,1,-2.6789,-7.3912,0,-3.0616,-4.9497,1,-4.9497,-7,1,0],
// 5 24 -4.9497 1 -4.9497 -5.6568 0 -5.6568 -2.6789 1 -6.4673 -6.4673 1 -2.6789
  [5,24,-4.9497,1,-4.9497,-5.6568,0,-5.6568,-2.6789,1,-6.4673,-6.4673,1,-2.6789],
// 5 24 -2.6789 1 -6.4673 -3.0616 0 -7.3912 0 1 -7 -4.9497 1 -4.9497
  [5,24,-2.6789,1,-6.4673,-3.0616,0,-7.3912,0,1,-7,-4.9497,1,-4.9497],
// 5 24 0 1 -7 0 0 -8 2.6789 1 -6.4673 -2.6789 1 -6.4673
  [5,24,0,1,-7,0,0,-8,2.6789,1,-6.4673,-2.6789,1,-6.4673],
// 5 24 2.6789 1 -6.4673 3.0616 0 -7.3912 4.9497 1 -4.9497 0 1 -7
  [5,24,2.6789,1,-6.4673,3.0616,0,-7.3912,4.9497,1,-4.9497,0,1,-7],
// 5 24 4.9497 1 -4.9497 5.6568 0 -5.6568 6.4673 1 -2.6789 2.6789 1 -6.4673
  [5,24,4.9497,1,-4.9497,5.6568,0,-5.6568,6.4673,1,-2.6789,2.6789,1,-6.4673],
// 5 24 6.4673 1 -2.6789 7.3912 0 -3.0616 7 1 0 4.9497 1 -4.9497
  [5,24,6.4673,1,-2.6789,7.3912,0,-3.0616,7,1,0,4.9497,1,-4.9497],
// 
// 4 16 7 1 0 6.4673 1 2.6789 7.3912 0 3.0616 8 0 0
  [4,16,7,1,0,6.4673,1,2.6789,7.3912,0,3.0616,8,0,0],
// 4 16 6.4673 1 2.6789 4.9497 1 4.9497 5.6568 0 5.6568 7.3912 0 3.0616
  [4,16,6.4673,1,2.6789,4.9497,1,4.9497,5.6568,0,5.6568,7.3912,0,3.0616],
// 4 16 4.9497 1 4.9497 2.6789 1 6.4673 3.0616 0 7.3912 5.6568 0 5.6568
  [4,16,4.9497,1,4.9497,2.6789,1,6.4673,3.0616,0,7.3912,5.6568,0,5.6568],
// 4 16 2.6789 1 6.4673 0 1 7 0 0 8 3.0616 0 7.3912
  [4,16,2.6789,1,6.4673,0,1,7,0,0,8,3.0616,0,7.3912],
// 4 16 0 1 7 -2.6789 1 6.4673 -3.0616 0 7.3912 0 0 8
  [4,16,0,1,7,-2.6789,1,6.4673,-3.0616,0,7.3912,0,0,8],
// 4 16 -2.6789 1 6.4673 -4.9497 1 4.9497 -5.6568 0 5.6568 -3.0616 0 7.3912
  [4,16,-2.6789,1,6.4673,-4.9497,1,4.9497,-5.6568,0,5.6568,-3.0616,0,7.3912],
// 4 16 -4.9497 1 4.9497 -6.4673 1 2.6789 -7.3912 0 3.0616 -5.6568 0 5.6568
  [4,16,-4.9497,1,4.9497,-6.4673,1,2.6789,-7.3912,0,3.0616,-5.6568,0,5.6568],
// 4 16 -6.4673 1 2.6789 -7 1 0 -8 0 0 -7.3912 0 3.0616
  [4,16,-6.4673,1,2.6789,-7,1,0,-8,0,0,-7.3912,0,3.0616],
// 4 16 -7 1 0 -6.4673 1 -2.6789 -7.3912 0 -3.0616 -8 0 0
  [4,16,-7,1,0,-6.4673,1,-2.6789,-7.3912,0,-3.0616,-8,0,0],
// 4 16 -6.4673 1 -2.6789 -4.9497 1 -4.9497 -5.6568 0 -5.6568 -7.3912 0 -3.0616
  [4,16,-6.4673,1,-2.6789,-4.9497,1,-4.9497,-5.6568,0,-5.6568,-7.3912,0,-3.0616],
// 4 16 -4.9497 1 -4.9497 -2.6789 1 -6.4673 -3.0616 0 -7.3912 -5.6568 0 -5.6568
  [4,16,-4.9497,1,-4.9497,-2.6789,1,-6.4673,-3.0616,0,-7.3912,-5.6568,0,-5.6568],
// 4 16 -2.6789 1 -6.4673 0 1 -7 0 0 -8 -3.0616 0 -7.3912
  [4,16,-2.6789,1,-6.4673,0,1,-7,0,0,-8,-3.0616,0,-7.3912],
// 4 16 0 1 -7 2.6789 1 -6.4673 3.0616 0 -7.3912 0 0 -8
  [4,16,0,1,-7,2.6789,1,-6.4673,3.0616,0,-7.3912,0,0,-8],
// 4 16 2.6789 1 -6.4673 4.9497 1 -4.9497 5.6568 0 -5.6568 3.0616 0 -7.3912
  [4,16,2.6789,1,-6.4673,4.9497,1,-4.9497,5.6568,0,-5.6568,3.0616,0,-7.3912],
// 4 16 4.9497 1 -4.9497 6.4673 1 -2.6789 7.3912 0 -3.0616 5.6568 0 -5.6568
  [4,16,4.9497,1,-4.9497,6.4673,1,-2.6789,7.3912,0,-3.0616,5.6568,0,-5.6568],
// 4 16 6.4673 1 -2.6789 7 1 0 8 0 0 7.3912 0 -3.0616
  [4,16,6.4673,1,-2.6789,7,1,0,8,0,0,7.3912,0,-3.0616],
// 
// 0
// 
];
makepoly(ldraw_lib__4_4con7(), line=0.2);
// file: ../p/4-4con16.scad
use <../lib.scad>
function ldraw_lib__4_4con16() = [
// 0 Cone 16 x 1.0
// 0 Name: 4-4con16.dat
// 0 Author: John Riley [jriley]
// 0 !LDRAW_ORG Primitive UPDATE 2012-01
// 0 !LICENSE Licensed under CC BY 2.0 and CC BY 4.0 : see CAreadme.txt
// 
// 0 BFC CERTIFY CCW
  [0,"BFC","CERTIFY"],
  [0,"BFC","CCW"],
// 
// 0 !HISTORY 2003-12-19 [PTadmin] Official Update 2003-03
// 0 !HISTORY 2007-06-24 [PTadmin] Header formatted for Contributor Agreement
// 0 !HISTORY 2008-07-01 [PTadmin] Official Update 2008-01
// 0 !HISTORY 2012-02-16 [Philo] Changed to CCW
// 0 !HISTORY 2012-03-30 [PTadmin] Official Update 2012-01
// 
// 
// 4 16 14.7824 1 6.1232 15.7063 0 6.5059 17 0 0 16 1 0
  [4,16,14.7824,1,6.1232,15.7063,0,6.5059,17,0,0,16,1,0],
// 4 16 11.3136 1 11.3136 12.0207 0 12.0207 15.7063 0 6.5059 14.7824 1 6.1232
  [4,16,11.3136,1,11.3136,12.0207,0,12.0207,15.7063,0,6.5059,14.7824,1,6.1232],
// 4 16 6.1232 1 14.7824 6.5059 0 15.7063 12.0207 0 12.0207 11.3136 1 11.3136
  [4,16,6.1232,1,14.7824,6.5059,0,15.7063,12.0207,0,12.0207,11.3136,1,11.3136],
// 4 16 0 1 16 0 0 17 6.5059 0 15.7063 6.1232 1 14.7824
  [4,16,0,1,16,0,0,17,6.5059,0,15.7063,6.1232,1,14.7824],
// 4 16 -6.1232 1 14.7824 -6.5059 0 15.7063 0 0 17 0 1 16
  [4,16,-6.1232,1,14.7824,-6.5059,0,15.7063,0,0,17,0,1,16],
// 4 16 -11.3136 1 11.3136 -12.0207 0 12.0207 -6.5059 0 15.7063 -6.1232 1 14.7824
  [4,16,-11.3136,1,11.3136,-12.0207,0,12.0207,-6.5059,0,15.7063,-6.1232,1,14.7824],
// 4 16 -14.7824 1 6.1232 -15.7063 0 6.5059 -12.0207 0 12.0207 -11.3136 1 11.3136
  [4,16,-14.7824,1,6.1232,-15.7063,0,6.5059,-12.0207,0,12.0207,-11.3136,1,11.3136],
// 4 16 -16 1 0 -17 0 0 -15.7063 0 6.5059 -14.7824 1 6.1232
  [4,16,-16,1,0,-17,0,0,-15.7063,0,6.5059,-14.7824,1,6.1232],
// 4 16 -14.7824 1 -6.1232 -15.7063 0 -6.5059 -17 0 0 -16 1 0
  [4,16,-14.7824,1,-6.1232,-15.7063,0,-6.5059,-17,0,0,-16,1,0],
// 4 16 -11.3136 1 -11.3136 -12.0207 0 -12.0207 -15.7063 0 -6.5059 -14.7824 1 -6.1232
  [4,16,-11.3136,1,-11.3136,-12.0207,0,-12.0207,-15.7063,0,-6.5059,-14.7824,1,-6.1232],
// 4 16 -6.1232 1 -14.7824 -6.5059 0 -15.7063 -12.0207 0 -12.0207 -11.3136 1 -11.3136
  [4,16,-6.1232,1,-14.7824,-6.5059,0,-15.7063,-12.0207,0,-12.0207,-11.3136,1,-11.3136],
// 4 16 0 1 -16 0 0 -17 -6.5059 0 -15.7063 -6.1232 1 -14.7824
  [4,16,0,1,-16,0,0,-17,-6.5059,0,-15.7063,-6.1232,1,-14.7824],
// 4 16 6.1232 1 -14.7824 6.5059 0 -15.7063 0 0 -17 0 1 -16
  [4,16,6.1232,1,-14.7824,6.5059,0,-15.7063,0,0,-17,0,1,-16],
// 4 16 11.3136 1 -11.3136 12.0207 0 -12.0207 6.5059 0 -15.7063 6.1232 1 -14.7824
  [4,16,11.3136,1,-11.3136,12.0207,0,-12.0207,6.5059,0,-15.7063,6.1232,1,-14.7824],
// 4 16 14.7824 1 -6.1232 15.7063 0 -6.5059 12.0207 0 -12.0207 11.3136 1 -11.3136
  [4,16,14.7824,1,-6.1232,15.7063,0,-6.5059,12.0207,0,-12.0207,11.3136,1,-11.3136],
// 4 16 16 1 0 17 0 0 15.7063 0 -6.5059 14.7824 1 -6.1232
  [4,16,16,1,0,17,0,0,15.7063,0,-6.5059,14.7824,1,-6.1232],
// 
// 5 24 16 1 0 17 0 0 14.7824 1 6.1232 14.7824 1 -6.1232
  [5,24,16,1,0,17,0,0,14.7824,1,6.1232,14.7824,1,-6.1232],
// 5 24 14.7824 1 6.1232 15.7063 0 6.5059 11.3136 1 11.3136 16 1 0
  [5,24,14.7824,1,6.1232,15.7063,0,6.5059,11.3136,1,11.3136,16,1,0],
// 5 24 11.3136 1 11.3136 12.0207 0 12.0207 6.1232 1 14.7824 14.7824 1 6.1232
  [5,24,11.3136,1,11.3136,12.0207,0,12.0207,6.1232,1,14.7824,14.7824,1,6.1232],
// 5 24 6.1232 1 14.7824 6.5059 0 15.7063 0 1 16 11.3136 1 11.3136
  [5,24,6.1232,1,14.7824,6.5059,0,15.7063,0,1,16,11.3136,1,11.3136],
// 5 24 0 1 16 0 0 17 -6.1232 1 14.7824 6.1232 1 14.7824
  [5,24,0,1,16,0,0,17,-6.1232,1,14.7824,6.1232,1,14.7824],
// 5 24 -6.1232 1 14.7824 -6.5059 0 15.7063 -11.3136 1 11.3136 0 1 16
  [5,24,-6.1232,1,14.7824,-6.5059,0,15.7063,-11.3136,1,11.3136,0,1,16],
// 5 24 -11.3136 1 11.3136 -12.0207 0 12.0207 -14.7824 1 6.1232 -6.1232 1 14.7824
  [5,24,-11.3136,1,11.3136,-12.0207,0,12.0207,-14.7824,1,6.1232,-6.1232,1,14.7824],
// 5 24 -14.7824 1 6.1232 -15.7063 0 6.5059 -16 1 0 -11.3136 1 11.3136
  [5,24,-14.7824,1,6.1232,-15.7063,0,6.5059,-16,1,0,-11.3136,1,11.3136],
// 5 24 -16 1 0 -17 0 0 -14.7824 1 -6.1232 -14.7824 1 6.1232
  [5,24,-16,1,0,-17,0,0,-14.7824,1,-6.1232,-14.7824,1,6.1232],
// 5 24 -14.7824 1 -6.1232 -15.7063 0 -6.5059 -11.3136 1 -11.3136 -16 1 0
  [5,24,-14.7824,1,-6.1232,-15.7063,0,-6.5059,-11.3136,1,-11.3136,-16,1,0],
// 5 24 -11.3136 1 -11.3136 -12.0207 0 -12.0207 -6.1232 1 -14.7824 -14.7824 1 -6.1232
  [5,24,-11.3136,1,-11.3136,-12.0207,0,-12.0207,-6.1232,1,-14.7824,-14.7824,1,-6.1232],
// 5 24 -6.1232 1 -14.7824 -6.5059 0 -15.7063 0 1 -16 -11.3136 1 -11.3136
  [5,24,-6.1232,1,-14.7824,-6.5059,0,-15.7063,0,1,-16,-11.3136,1,-11.3136],
// 5 24 0 1 -16 0 0 -17 6.1232 1 -14.7824 -6.1232 1 -14.7824
  [5,24,0,1,-16,0,0,-17,6.1232,1,-14.7824,-6.1232,1,-14.7824],
// 5 24 6.1232 1 -14.7824 6.5059 0 -15.7063 11.3136 1 -11.3136 0 1 -16
  [5,24,6.1232,1,-14.7824,6.5059,0,-15.7063,11.3136,1,-11.3136,0,1,-16],
// 5 24 11.3136 1 -11.3136 12.0207 0 -12.0207 14.7824 1 -6.1232 6.1232 1 -14.7824
  [5,24,11.3136,1,-11.3136,12.0207,0,-12.0207,14.7824,1,-6.1232,6.1232,1,-14.7824],
// 5 24 14.7824 1 -6.1232 15.7063 0 -6.5059 16 1 0 11.3136 1 -11.3136
  [5,24,14.7824,1,-6.1232,15.7063,0,-6.5059,16,1,0,11.3136,1,-11.3136],
];
makepoly(ldraw_lib__4_4con16(), line=0.2);
// file: ../p/4-4con13.scad
use <../lib.scad>
function ldraw_lib__4_4con13() = [
// 0 Cone 13 x 1.0
// 0 Name: 4-4con13.dat
// 0 Author: Michael Heidemann [mikeheide]
// 0 !LDRAW_ORG Primitive UPDATE 2010-02
// 0 !LICENSE Licensed under CC BY 2.0 and CC BY 4.0 : see CAreadme.txt
// 
// 0 BFC CERTIFY CCW
  [0,"BFC","CERTIFY"],
  [0,"BFC","CCW"],
// 
// 0 !HISTORY 2010-07-05 [PTadmin] Official Update 2010-02
// 
// 
// 4 16 13 1 0 12.0107 1 4.9751 12.9346 0 5.3578 14 0 0
  [4,16,13,1,0,12.0107,1,4.9751,12.9346,0,5.3578,14,0,0],
// 4 16 12.0107 1 4.9751 9.1923 1 9.1923 9.8994 0 9.8994 12.9346 0 5.3578
  [4,16,12.0107,1,4.9751,9.1923,1,9.1923,9.8994,0,9.8994,12.9346,0,5.3578],
// 4 16 9.1923 1 9.1923 4.9751 1 12.0107 5.3578 0 12.9346 9.8994 0 9.8994
  [4,16,9.1923,1,9.1923,4.9751,1,12.0107,5.3578,0,12.9346,9.8994,0,9.8994],
// 4 16 4.9751 1 12.0107 0 1 13 0 0 14 5.3578 0 12.9346
  [4,16,4.9751,1,12.0107,0,1,13,0,0,14,5.3578,0,12.9346],
// 4 16 0 1 13 -4.9751 1 12.0107 -5.3578 0 12.9346 0 0 14
  [4,16,0,1,13,-4.9751,1,12.0107,-5.3578,0,12.9346,0,0,14],
// 4 16 -4.9751 1 12.0107 -9.1923 1 9.1923 -9.8994 0 9.8994 -5.3578 0 12.9346
  [4,16,-4.9751,1,12.0107,-9.1923,1,9.1923,-9.8994,0,9.8994,-5.3578,0,12.9346],
// 4 16 -9.1923 1 9.1923 -12.0107 1 4.9751 -12.9346 0 5.3578 -9.8994 0 9.8994
  [4,16,-9.1923,1,9.1923,-12.0107,1,4.9751,-12.9346,0,5.3578,-9.8994,0,9.8994],
// 4 16 -12.0107 1 4.9751 -13 1 0 -14 0 0 -12.9346 0 5.3578
  [4,16,-12.0107,1,4.9751,-13,1,0,-14,0,0,-12.9346,0,5.3578],
// 4 16 -13 1 0 -12.0107 1 -4.9751 -12.9346 0 -5.3578 -14 0 0
  [4,16,-13,1,0,-12.0107,1,-4.9751,-12.9346,0,-5.3578,-14,0,0],
// 4 16 -12.0107 1 -4.9751 -9.1923 1 -9.1923 -9.8994 0 -9.8994 -12.9346 0 -5.3578
  [4,16,-12.0107,1,-4.9751,-9.1923,1,-9.1923,-9.8994,0,-9.8994,-12.9346,0,-5.3578],
// 4 16 -9.1923 1 -9.1923 -4.9751 1 -12.0107 -5.3578 0 -12.9346 -9.8994 0 -9.8994
  [4,16,-9.1923,1,-9.1923,-4.9751,1,-12.0107,-5.3578,0,-12.9346,-9.8994,0,-9.8994],
// 4 16 -4.9751 1 -12.0107 0 1 -13 0 0 -14 -5.3578 0 -12.9346
  [4,16,-4.9751,1,-12.0107,0,1,-13,0,0,-14,-5.3578,0,-12.9346],
// 4 16 0 1 -13 4.9751 1 -12.0107 5.3578 0 -12.9346 0 0 -14
  [4,16,0,1,-13,4.9751,1,-12.0107,5.3578,0,-12.9346,0,0,-14],
// 4 16 4.9751 1 -12.0107 9.1923 1 -9.1923 9.8994 0 -9.8994 5.3578 0 -12.9346
  [4,16,4.9751,1,-12.0107,9.1923,1,-9.1923,9.8994,0,-9.8994,5.3578,0,-12.9346],
// 4 16 9.1923 1 -9.1923 12.0107 1 -4.9751 12.9346 0 -5.3578 9.8994 0 -9.8994
  [4,16,9.1923,1,-9.1923,12.0107,1,-4.9751,12.9346,0,-5.3578,9.8994,0,-9.8994],
// 4 16 12.0107 1 -4.9751 13 1 0 14 0 0 12.9346 0 -5.3578
  [4,16,12.0107,1,-4.9751,13,1,0,14,0,0,12.9346,0,-5.3578],
// 
// 0 conditional lines
// 5 24 13 1 0 14 0 0 12.0107 1 -4.9751 12.0107 1 4.9751
  [5,24,13,1,0,14,0,0,12.0107,1,-4.9751,12.0107,1,4.9751],
// 5 24 12.0107 1 4.9751 12.9346 0 5.3578 13 1 0 9.1923 1 9.1923
  [5,24,12.0107,1,4.9751,12.9346,0,5.3578,13,1,0,9.1923,1,9.1923],
// 5 24 9.1923 1 9.1923 9.8994 0 9.8994 12.0107 1 4.9751 4.9751 1 12.0107
  [5,24,9.1923,1,9.1923,9.8994,0,9.8994,12.0107,1,4.9751,4.9751,1,12.0107],
// 5 24 4.9751 1 12.0107 5.3578 0 12.9346 9.1923 1 9.1923 0 1 13
  [5,24,4.9751,1,12.0107,5.3578,0,12.9346,9.1923,1,9.1923,0,1,13],
// 5 24 0 1 13 0 0 14 4.9751 1 12.0107 -4.9751 1 12.0107
  [5,24,0,1,13,0,0,14,4.9751,1,12.0107,-4.9751,1,12.0107],
// 5 24 -4.9751 1 12.0107 -5.3578 0 12.9346 0 1 13 -9.1923 1 9.1923
  [5,24,-4.9751,1,12.0107,-5.3578,0,12.9346,0,1,13,-9.1923,1,9.1923],
// 5 24 -9.1923 1 9.1923 -9.8994 0 9.8994 -4.9751 1 12.0107 -12.0107 1 4.9751
  [5,24,-9.1923,1,9.1923,-9.8994,0,9.8994,-4.9751,1,12.0107,-12.0107,1,4.9751],
// 5 24 -12.0107 1 4.9751 -12.9346 0 5.3578 -9.1923 1 9.1923 -13 1 0
  [5,24,-12.0107,1,4.9751,-12.9346,0,5.3578,-9.1923,1,9.1923,-13,1,0],
// 5 24 -13 1 0 -14 0 0 -12.0107 1 4.9751 -12.0107 1 -4.9751
  [5,24,-13,1,0,-14,0,0,-12.0107,1,4.9751,-12.0107,1,-4.9751],
// 5 24 -12.0107 1 -4.9751 -12.9346 0 -5.3578 -13 1 0 -9.1923 1 -9.1923
  [5,24,-12.0107,1,-4.9751,-12.9346,0,-5.3578,-13,1,0,-9.1923,1,-9.1923],
// 5 24 -9.1923 1 -9.1923 -9.8994 0 -9.8994 -12.0107 1 -4.9751 -4.9751 1 -12.0107
  [5,24,-9.1923,1,-9.1923,-9.8994,0,-9.8994,-12.0107,1,-4.9751,-4.9751,1,-12.0107],
// 5 24 -4.9751 1 -12.0107 -5.3578 0 -12.9346 -9.1923 1 -9.1923 0 1 -13
  [5,24,-4.9751,1,-12.0107,-5.3578,0,-12.9346,-9.1923,1,-9.1923,0,1,-13],
// 5 24 0 1 -13 0 0 -14 -4.9751 1 -12.0107 4.9751 1 -12.0107
  [5,24,0,1,-13,0,0,-14,-4.9751,1,-12.0107,4.9751,1,-12.0107],
// 5 24 4.9751 1 -12.0107 5.3578 0 -12.9346 0 1 -13 9.1923 1 -9.1923
  [5,24,4.9751,1,-12.0107,5.3578,0,-12.9346,0,1,-13,9.1923,1,-9.1923],
// 5 24 9.1923 1 -9.1923 9.8994 0 -9.8994 4.9751 1 -12.0107 12.0107 1 -4.9751
  [5,24,9.1923,1,-9.1923,9.8994,0,-9.8994,4.9751,1,-12.0107,12.0107,1,-4.9751],
// 5 24 12.0107 1 -4.9751 12.9346 0 -5.3578 9.1923 1 -9.1923 13 1 0
  [5,24,12.0107,1,-4.9751,12.9346,0,-5.3578,9.1923,1,-9.1923,13,1,0],
// 
// 0 end of file
// 
];
makepoly(ldraw_lib__4_4con13(), line=0.2);
// main file
use <../lib.scad>
use <../p/4-4con13.scad>
use <../p/4-4con16.scad>
use <../p/4-4con7.scad>
use <../p/4-4con8.scad>
use <../p/4-4cyli.scad>
use <../p/4-4edge.scad>
use <../p/4-4rin13.scad>
use <../p/4-4rin17.scad>
function ldraw_lib__u9238() = [
// 0 ~Pin Hollow for Electric Plug (Type 1) Twin or Single
// 0 Name: u9238.dat
// 0 Author: Steffen [Steffen]
// 0 !LDRAW_ORG Part UPDATE 2022-04
// 0 !LICENSE Licensed under CC BY 2.0 and CC BY 4.0 : see CAreadme.txt
// 
// 0 BFC CERTIFY CCW
  [0,"BFC","CERTIFY"],
  [0,"BFC","CCW"],
// 
// 0 !CATEGORY Electric
// 
// 0 !HISTORY 2012-11-05 [mikeheide] Added some lines for demonstration
// 0 !HISTORY 2022-01-22 [mikeheide] Made it more like a foil. Still the gap missing and the tip slanting.
// 0 !HISTORY 2022-07-18 [PTadmin] Official Update 2022-04
// 
// 
// 0 // THIS FILE IS A MOCKUP
// 0 // --- 1 14 0 0 0 1 0 0 0 1 0 0 0 1 u9018.dat
// 
// 1 494 0 0 -14 -3.5 0 0 0 0 3.5 0 13 0 4-4cyli.dat
  [1,494,0,0,-14,-3.5,0,0,0,0,3.5,0,13,0, ldraw_lib__4_4cyli()],
// 0 BFC INVERTNEXT
  [0,"BFC","INVERTNEXT"],
// 1 494 0 0 -14 -3.25 0 0 0 0 3.25 0 14 0 4-4cyli.dat
  [1,494,0,0,-14,-3.25,0,0,0,0,3.25,0,14,0, ldraw_lib__4_4cyli()],
// 1 494 0 0 -14 3.25 0 0 0 0 3.25 0 -1 0 4-4edge.dat
  [1,494,0,0,-14,3.25,0,0,0,0,3.25,0,-1,0, ldraw_lib__4_4edge()],
// 1 494 0 0 0 3.25 0 0 0 0 3.25 0 -1 0 4-4edge.dat
  [1,494,0,0,0,3.25,0,0,0,0,3.25,0,-1,0, ldraw_lib__4_4edge()],
// 1 494 0 0 -14 3.5 0 0 0 0 3.5 0 -1 0 4-4edge.dat
  [1,494,0,0,-14,3.5,0,0,0,0,3.5,0,-1,0, ldraw_lib__4_4edge()],
// 1 494 0 0 -1 3.5 0 0 0 0 3.5 0 -1 0 4-4edge.dat
  [1,494,0,0,-1,3.5,0,0,0,0,3.5,0,-1,0, ldraw_lib__4_4edge()],
// 1 494 0 0 0 4.5 0 0 0 0 4.5 0 -1 0 4-4edge.dat
  [1,494,0,0,0,4.5,0,0,0,0,4.5,0,-1,0, ldraw_lib__4_4edge()],
// 1 494 0 0 22 4.5 0 0 0 0 4.5 0 -1 0 4-4edge.dat
  [1,494,0,0,22,4.5,0,0,0,0,4.5,0,-1,0, ldraw_lib__4_4edge()],
// 1 494 0 0 22 4.25 0 0 0 0 4.25 0 -1 0 4-4edge.dat
  [1,494,0,0,22,4.25,0,0,0,0,4.25,0,-1,0, ldraw_lib__4_4edge()],
// 1 494 0 0 1 4.25 0 0 0 0 4.25 0 -1 0 4-4edge.dat
  [1,494,0,0,1,4.25,0,0,0,0,4.25,0,-1,0, ldraw_lib__4_4edge()],
// 1 494 0 0 -14 -0.25 0 0 0 0 0.25 0 1 0 4-4rin13.dat
  [1,494,0,0,-14,-0.25,0,0,0,0,0.25,0,1,0, ldraw_lib__4_4rin13()],
// 1 494 0 0 22 0.25 0 0 0 0 0.25 0 -1 0 4-4rin17.dat
  [1,494,0,0,22,0.25,0,0,0,0,0.25,0,-1,0, ldraw_lib__4_4rin17()],
// 
// 0 // Added lines behind this line for demonstration
// 1 494 0 0 0 4.5 0 0 0 0 -4.5 0 22 0 4-4cyli.dat
  [1,494,0,0,0,4.5,0,0,0,0,-4.5,0,22,0, ldraw_lib__4_4cyli()],
// 0 BFC INVERTNEXT
  [0,"BFC","INVERTNEXT"],
// 1 494 0 0 1 4.25 0 0 0 0 -4.25 0 21 0 4-4cyli.dat
  [1,494,0,0,1,4.25,0,0,0,0,-4.25,0,21,0, ldraw_lib__4_4cyli()],
// 1 494 0 0 -0.5 -0.5 0 0 0 0 -0.5 0 -0.5 0 4-4con7.dat
  [1,494,0,0,-0.5,-0.5,0,0,0,0,-0.5,0,-0.5,0, ldraw_lib__4_4con7()],
// 1 494 0 0 0 -0.5 0 0 0 0 -0.5 0 -0.5 0 4-4con8.dat
  [1,494,0,0,0,-0.5,0,0,0,0,-0.5,0,-0.5,0, ldraw_lib__4_4con8()],
// 0 BFC INVERTNEXT
  [0,"BFC","INVERTNEXT"],
// 1 494 0 0 0.25 -0.25 0 0 0 0 -0.25 0 -0.25 0 4-4con13.dat
  [1,494,0,0,0.25,-0.25,0,0,0,0,-0.25,0,-0.25,0, ldraw_lib__4_4con13()],
// 0 BFC INVERTNEXT
  [0,"BFC","INVERTNEXT"],
// 1 494 0 0 1 -0.25 0 0 0 0 -0.25 0 -0.25 0 4-4con16.dat
  [1,494,0,0,1,-0.25,0,0,0,0,-0.25,0,-0.25,0, ldraw_lib__4_4con16()],
// 0 BFC INVERTNEXT
  [0,"BFC","INVERTNEXT"],
// 1 494 0 0 0.75 -0.5 0 0 0 0 -0.5 0 -0.5 0 4-4con7.dat
  [1,494,0,0,0.75,-0.5,0,0,0,0,-0.5,0,-0.5,0, ldraw_lib__4_4con7()],
];
makepoly(ldraw_lib__u9238(), line=0.2);
